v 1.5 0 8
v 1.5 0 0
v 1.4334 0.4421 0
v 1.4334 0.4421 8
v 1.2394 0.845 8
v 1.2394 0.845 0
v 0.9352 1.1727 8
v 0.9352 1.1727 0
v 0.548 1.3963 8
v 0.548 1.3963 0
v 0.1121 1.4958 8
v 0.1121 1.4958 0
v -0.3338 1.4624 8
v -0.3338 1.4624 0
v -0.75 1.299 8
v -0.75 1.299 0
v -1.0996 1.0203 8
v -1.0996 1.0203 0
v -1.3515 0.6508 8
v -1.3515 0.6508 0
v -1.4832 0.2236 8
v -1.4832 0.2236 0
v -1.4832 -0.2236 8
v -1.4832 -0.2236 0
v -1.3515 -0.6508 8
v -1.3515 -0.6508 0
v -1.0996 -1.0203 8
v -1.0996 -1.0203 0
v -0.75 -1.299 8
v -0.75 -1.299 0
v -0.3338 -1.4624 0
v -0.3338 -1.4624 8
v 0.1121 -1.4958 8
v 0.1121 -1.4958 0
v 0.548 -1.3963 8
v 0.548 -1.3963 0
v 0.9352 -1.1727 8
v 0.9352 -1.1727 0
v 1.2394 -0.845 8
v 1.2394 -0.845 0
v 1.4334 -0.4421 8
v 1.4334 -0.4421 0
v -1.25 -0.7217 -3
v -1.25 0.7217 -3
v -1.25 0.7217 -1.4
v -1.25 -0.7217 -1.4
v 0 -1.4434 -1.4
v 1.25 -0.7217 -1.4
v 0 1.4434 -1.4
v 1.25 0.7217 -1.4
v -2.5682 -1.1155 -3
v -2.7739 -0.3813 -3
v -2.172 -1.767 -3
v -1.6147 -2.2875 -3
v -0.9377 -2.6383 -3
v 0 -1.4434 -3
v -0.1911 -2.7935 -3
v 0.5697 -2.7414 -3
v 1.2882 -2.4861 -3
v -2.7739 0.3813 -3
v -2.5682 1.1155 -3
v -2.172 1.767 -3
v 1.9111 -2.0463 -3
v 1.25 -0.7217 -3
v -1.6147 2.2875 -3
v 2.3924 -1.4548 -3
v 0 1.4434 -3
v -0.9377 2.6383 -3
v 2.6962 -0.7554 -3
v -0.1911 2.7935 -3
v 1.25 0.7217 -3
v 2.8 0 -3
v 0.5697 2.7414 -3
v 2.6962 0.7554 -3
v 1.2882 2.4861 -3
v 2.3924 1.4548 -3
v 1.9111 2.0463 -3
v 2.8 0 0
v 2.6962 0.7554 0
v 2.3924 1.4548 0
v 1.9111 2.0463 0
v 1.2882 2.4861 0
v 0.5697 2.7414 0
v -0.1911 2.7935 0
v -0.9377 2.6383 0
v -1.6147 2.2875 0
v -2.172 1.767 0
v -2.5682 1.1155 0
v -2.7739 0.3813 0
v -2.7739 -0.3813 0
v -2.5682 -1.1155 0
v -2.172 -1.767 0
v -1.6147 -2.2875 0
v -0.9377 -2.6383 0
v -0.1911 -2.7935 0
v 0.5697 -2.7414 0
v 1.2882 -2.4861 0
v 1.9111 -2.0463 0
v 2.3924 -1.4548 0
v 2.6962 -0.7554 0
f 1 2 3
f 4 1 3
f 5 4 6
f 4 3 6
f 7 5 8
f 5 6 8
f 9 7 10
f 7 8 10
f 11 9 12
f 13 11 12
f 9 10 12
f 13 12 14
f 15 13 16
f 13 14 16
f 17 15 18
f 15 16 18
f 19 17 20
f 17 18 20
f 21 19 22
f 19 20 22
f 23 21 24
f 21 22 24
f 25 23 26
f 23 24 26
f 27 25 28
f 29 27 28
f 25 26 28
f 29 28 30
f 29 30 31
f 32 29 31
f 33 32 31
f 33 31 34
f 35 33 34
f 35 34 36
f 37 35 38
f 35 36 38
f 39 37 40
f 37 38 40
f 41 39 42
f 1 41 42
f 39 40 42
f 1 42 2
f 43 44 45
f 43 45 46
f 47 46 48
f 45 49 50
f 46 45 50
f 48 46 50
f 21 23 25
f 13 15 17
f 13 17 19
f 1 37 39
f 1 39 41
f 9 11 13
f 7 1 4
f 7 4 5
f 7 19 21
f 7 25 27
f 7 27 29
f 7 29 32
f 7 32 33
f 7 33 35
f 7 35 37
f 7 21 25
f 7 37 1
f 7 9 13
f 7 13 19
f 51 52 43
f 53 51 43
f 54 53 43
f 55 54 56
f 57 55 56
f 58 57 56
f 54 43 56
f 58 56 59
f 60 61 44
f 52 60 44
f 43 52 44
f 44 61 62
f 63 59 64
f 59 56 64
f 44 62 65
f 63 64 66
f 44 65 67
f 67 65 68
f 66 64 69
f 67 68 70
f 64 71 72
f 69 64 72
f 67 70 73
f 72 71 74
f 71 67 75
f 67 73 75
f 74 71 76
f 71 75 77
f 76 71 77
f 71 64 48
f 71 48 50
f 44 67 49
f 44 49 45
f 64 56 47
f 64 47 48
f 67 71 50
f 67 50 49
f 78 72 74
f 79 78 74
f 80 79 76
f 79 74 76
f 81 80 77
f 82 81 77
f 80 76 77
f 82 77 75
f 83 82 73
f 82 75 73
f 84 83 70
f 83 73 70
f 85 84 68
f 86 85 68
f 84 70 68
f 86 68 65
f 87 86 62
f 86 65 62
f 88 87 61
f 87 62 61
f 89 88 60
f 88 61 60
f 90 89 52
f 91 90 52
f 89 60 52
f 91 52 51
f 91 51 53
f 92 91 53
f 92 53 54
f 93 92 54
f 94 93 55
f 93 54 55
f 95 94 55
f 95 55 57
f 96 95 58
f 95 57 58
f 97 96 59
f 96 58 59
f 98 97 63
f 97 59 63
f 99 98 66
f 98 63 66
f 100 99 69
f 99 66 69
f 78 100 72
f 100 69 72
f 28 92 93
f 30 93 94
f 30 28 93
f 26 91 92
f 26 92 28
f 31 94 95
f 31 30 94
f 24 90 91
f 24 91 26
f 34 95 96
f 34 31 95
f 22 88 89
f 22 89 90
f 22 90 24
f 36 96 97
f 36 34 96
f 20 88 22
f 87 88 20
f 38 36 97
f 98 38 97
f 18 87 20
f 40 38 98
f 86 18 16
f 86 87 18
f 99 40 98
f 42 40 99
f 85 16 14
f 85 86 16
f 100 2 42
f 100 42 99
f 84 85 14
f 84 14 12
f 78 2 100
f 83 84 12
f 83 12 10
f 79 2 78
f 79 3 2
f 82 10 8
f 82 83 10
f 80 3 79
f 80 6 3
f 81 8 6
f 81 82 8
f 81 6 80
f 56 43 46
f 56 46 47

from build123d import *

# Parameters (mm, degrees)
HEAD_START       = -3
SKETCH1_R        = 2.8
HEAD_DEPTH       = 3
SKETCH2_R        = 1.5
SHANK_DEPTH      = 8
HEX_START        = -3.2
HEX_SOCKET_DEPTH = 1.8


with BuildPart() as part:
    # Sketch1 → Head (new body)
    with BuildSketch(Plane.XY.offset(HEAD_START)):
        Circle(SKETCH1_R)
    extrude(amount=HEAD_DEPTH)

    # Sketch2 → Shank (add)
    with BuildSketch(Plane.XY):
        Circle(SKETCH2_R)
    extrude(amount=SHANK_DEPTH)

    # Sketch3 → Hex socket (cut)
    with BuildSketch(Plane.XY.offset(HEX_START)):
        Polygon((1.25, 0.721687836), (0, 1.443375673), (-1.25, 0.721687836), (-1.25, -0.721687836), (0, -1.443375673), (1.25, -0.721687836), align=None)
    extrude(amount=HEX_SOCKET_DEPTH, mode=Mode.SUBTRACT)


solid = part.part
